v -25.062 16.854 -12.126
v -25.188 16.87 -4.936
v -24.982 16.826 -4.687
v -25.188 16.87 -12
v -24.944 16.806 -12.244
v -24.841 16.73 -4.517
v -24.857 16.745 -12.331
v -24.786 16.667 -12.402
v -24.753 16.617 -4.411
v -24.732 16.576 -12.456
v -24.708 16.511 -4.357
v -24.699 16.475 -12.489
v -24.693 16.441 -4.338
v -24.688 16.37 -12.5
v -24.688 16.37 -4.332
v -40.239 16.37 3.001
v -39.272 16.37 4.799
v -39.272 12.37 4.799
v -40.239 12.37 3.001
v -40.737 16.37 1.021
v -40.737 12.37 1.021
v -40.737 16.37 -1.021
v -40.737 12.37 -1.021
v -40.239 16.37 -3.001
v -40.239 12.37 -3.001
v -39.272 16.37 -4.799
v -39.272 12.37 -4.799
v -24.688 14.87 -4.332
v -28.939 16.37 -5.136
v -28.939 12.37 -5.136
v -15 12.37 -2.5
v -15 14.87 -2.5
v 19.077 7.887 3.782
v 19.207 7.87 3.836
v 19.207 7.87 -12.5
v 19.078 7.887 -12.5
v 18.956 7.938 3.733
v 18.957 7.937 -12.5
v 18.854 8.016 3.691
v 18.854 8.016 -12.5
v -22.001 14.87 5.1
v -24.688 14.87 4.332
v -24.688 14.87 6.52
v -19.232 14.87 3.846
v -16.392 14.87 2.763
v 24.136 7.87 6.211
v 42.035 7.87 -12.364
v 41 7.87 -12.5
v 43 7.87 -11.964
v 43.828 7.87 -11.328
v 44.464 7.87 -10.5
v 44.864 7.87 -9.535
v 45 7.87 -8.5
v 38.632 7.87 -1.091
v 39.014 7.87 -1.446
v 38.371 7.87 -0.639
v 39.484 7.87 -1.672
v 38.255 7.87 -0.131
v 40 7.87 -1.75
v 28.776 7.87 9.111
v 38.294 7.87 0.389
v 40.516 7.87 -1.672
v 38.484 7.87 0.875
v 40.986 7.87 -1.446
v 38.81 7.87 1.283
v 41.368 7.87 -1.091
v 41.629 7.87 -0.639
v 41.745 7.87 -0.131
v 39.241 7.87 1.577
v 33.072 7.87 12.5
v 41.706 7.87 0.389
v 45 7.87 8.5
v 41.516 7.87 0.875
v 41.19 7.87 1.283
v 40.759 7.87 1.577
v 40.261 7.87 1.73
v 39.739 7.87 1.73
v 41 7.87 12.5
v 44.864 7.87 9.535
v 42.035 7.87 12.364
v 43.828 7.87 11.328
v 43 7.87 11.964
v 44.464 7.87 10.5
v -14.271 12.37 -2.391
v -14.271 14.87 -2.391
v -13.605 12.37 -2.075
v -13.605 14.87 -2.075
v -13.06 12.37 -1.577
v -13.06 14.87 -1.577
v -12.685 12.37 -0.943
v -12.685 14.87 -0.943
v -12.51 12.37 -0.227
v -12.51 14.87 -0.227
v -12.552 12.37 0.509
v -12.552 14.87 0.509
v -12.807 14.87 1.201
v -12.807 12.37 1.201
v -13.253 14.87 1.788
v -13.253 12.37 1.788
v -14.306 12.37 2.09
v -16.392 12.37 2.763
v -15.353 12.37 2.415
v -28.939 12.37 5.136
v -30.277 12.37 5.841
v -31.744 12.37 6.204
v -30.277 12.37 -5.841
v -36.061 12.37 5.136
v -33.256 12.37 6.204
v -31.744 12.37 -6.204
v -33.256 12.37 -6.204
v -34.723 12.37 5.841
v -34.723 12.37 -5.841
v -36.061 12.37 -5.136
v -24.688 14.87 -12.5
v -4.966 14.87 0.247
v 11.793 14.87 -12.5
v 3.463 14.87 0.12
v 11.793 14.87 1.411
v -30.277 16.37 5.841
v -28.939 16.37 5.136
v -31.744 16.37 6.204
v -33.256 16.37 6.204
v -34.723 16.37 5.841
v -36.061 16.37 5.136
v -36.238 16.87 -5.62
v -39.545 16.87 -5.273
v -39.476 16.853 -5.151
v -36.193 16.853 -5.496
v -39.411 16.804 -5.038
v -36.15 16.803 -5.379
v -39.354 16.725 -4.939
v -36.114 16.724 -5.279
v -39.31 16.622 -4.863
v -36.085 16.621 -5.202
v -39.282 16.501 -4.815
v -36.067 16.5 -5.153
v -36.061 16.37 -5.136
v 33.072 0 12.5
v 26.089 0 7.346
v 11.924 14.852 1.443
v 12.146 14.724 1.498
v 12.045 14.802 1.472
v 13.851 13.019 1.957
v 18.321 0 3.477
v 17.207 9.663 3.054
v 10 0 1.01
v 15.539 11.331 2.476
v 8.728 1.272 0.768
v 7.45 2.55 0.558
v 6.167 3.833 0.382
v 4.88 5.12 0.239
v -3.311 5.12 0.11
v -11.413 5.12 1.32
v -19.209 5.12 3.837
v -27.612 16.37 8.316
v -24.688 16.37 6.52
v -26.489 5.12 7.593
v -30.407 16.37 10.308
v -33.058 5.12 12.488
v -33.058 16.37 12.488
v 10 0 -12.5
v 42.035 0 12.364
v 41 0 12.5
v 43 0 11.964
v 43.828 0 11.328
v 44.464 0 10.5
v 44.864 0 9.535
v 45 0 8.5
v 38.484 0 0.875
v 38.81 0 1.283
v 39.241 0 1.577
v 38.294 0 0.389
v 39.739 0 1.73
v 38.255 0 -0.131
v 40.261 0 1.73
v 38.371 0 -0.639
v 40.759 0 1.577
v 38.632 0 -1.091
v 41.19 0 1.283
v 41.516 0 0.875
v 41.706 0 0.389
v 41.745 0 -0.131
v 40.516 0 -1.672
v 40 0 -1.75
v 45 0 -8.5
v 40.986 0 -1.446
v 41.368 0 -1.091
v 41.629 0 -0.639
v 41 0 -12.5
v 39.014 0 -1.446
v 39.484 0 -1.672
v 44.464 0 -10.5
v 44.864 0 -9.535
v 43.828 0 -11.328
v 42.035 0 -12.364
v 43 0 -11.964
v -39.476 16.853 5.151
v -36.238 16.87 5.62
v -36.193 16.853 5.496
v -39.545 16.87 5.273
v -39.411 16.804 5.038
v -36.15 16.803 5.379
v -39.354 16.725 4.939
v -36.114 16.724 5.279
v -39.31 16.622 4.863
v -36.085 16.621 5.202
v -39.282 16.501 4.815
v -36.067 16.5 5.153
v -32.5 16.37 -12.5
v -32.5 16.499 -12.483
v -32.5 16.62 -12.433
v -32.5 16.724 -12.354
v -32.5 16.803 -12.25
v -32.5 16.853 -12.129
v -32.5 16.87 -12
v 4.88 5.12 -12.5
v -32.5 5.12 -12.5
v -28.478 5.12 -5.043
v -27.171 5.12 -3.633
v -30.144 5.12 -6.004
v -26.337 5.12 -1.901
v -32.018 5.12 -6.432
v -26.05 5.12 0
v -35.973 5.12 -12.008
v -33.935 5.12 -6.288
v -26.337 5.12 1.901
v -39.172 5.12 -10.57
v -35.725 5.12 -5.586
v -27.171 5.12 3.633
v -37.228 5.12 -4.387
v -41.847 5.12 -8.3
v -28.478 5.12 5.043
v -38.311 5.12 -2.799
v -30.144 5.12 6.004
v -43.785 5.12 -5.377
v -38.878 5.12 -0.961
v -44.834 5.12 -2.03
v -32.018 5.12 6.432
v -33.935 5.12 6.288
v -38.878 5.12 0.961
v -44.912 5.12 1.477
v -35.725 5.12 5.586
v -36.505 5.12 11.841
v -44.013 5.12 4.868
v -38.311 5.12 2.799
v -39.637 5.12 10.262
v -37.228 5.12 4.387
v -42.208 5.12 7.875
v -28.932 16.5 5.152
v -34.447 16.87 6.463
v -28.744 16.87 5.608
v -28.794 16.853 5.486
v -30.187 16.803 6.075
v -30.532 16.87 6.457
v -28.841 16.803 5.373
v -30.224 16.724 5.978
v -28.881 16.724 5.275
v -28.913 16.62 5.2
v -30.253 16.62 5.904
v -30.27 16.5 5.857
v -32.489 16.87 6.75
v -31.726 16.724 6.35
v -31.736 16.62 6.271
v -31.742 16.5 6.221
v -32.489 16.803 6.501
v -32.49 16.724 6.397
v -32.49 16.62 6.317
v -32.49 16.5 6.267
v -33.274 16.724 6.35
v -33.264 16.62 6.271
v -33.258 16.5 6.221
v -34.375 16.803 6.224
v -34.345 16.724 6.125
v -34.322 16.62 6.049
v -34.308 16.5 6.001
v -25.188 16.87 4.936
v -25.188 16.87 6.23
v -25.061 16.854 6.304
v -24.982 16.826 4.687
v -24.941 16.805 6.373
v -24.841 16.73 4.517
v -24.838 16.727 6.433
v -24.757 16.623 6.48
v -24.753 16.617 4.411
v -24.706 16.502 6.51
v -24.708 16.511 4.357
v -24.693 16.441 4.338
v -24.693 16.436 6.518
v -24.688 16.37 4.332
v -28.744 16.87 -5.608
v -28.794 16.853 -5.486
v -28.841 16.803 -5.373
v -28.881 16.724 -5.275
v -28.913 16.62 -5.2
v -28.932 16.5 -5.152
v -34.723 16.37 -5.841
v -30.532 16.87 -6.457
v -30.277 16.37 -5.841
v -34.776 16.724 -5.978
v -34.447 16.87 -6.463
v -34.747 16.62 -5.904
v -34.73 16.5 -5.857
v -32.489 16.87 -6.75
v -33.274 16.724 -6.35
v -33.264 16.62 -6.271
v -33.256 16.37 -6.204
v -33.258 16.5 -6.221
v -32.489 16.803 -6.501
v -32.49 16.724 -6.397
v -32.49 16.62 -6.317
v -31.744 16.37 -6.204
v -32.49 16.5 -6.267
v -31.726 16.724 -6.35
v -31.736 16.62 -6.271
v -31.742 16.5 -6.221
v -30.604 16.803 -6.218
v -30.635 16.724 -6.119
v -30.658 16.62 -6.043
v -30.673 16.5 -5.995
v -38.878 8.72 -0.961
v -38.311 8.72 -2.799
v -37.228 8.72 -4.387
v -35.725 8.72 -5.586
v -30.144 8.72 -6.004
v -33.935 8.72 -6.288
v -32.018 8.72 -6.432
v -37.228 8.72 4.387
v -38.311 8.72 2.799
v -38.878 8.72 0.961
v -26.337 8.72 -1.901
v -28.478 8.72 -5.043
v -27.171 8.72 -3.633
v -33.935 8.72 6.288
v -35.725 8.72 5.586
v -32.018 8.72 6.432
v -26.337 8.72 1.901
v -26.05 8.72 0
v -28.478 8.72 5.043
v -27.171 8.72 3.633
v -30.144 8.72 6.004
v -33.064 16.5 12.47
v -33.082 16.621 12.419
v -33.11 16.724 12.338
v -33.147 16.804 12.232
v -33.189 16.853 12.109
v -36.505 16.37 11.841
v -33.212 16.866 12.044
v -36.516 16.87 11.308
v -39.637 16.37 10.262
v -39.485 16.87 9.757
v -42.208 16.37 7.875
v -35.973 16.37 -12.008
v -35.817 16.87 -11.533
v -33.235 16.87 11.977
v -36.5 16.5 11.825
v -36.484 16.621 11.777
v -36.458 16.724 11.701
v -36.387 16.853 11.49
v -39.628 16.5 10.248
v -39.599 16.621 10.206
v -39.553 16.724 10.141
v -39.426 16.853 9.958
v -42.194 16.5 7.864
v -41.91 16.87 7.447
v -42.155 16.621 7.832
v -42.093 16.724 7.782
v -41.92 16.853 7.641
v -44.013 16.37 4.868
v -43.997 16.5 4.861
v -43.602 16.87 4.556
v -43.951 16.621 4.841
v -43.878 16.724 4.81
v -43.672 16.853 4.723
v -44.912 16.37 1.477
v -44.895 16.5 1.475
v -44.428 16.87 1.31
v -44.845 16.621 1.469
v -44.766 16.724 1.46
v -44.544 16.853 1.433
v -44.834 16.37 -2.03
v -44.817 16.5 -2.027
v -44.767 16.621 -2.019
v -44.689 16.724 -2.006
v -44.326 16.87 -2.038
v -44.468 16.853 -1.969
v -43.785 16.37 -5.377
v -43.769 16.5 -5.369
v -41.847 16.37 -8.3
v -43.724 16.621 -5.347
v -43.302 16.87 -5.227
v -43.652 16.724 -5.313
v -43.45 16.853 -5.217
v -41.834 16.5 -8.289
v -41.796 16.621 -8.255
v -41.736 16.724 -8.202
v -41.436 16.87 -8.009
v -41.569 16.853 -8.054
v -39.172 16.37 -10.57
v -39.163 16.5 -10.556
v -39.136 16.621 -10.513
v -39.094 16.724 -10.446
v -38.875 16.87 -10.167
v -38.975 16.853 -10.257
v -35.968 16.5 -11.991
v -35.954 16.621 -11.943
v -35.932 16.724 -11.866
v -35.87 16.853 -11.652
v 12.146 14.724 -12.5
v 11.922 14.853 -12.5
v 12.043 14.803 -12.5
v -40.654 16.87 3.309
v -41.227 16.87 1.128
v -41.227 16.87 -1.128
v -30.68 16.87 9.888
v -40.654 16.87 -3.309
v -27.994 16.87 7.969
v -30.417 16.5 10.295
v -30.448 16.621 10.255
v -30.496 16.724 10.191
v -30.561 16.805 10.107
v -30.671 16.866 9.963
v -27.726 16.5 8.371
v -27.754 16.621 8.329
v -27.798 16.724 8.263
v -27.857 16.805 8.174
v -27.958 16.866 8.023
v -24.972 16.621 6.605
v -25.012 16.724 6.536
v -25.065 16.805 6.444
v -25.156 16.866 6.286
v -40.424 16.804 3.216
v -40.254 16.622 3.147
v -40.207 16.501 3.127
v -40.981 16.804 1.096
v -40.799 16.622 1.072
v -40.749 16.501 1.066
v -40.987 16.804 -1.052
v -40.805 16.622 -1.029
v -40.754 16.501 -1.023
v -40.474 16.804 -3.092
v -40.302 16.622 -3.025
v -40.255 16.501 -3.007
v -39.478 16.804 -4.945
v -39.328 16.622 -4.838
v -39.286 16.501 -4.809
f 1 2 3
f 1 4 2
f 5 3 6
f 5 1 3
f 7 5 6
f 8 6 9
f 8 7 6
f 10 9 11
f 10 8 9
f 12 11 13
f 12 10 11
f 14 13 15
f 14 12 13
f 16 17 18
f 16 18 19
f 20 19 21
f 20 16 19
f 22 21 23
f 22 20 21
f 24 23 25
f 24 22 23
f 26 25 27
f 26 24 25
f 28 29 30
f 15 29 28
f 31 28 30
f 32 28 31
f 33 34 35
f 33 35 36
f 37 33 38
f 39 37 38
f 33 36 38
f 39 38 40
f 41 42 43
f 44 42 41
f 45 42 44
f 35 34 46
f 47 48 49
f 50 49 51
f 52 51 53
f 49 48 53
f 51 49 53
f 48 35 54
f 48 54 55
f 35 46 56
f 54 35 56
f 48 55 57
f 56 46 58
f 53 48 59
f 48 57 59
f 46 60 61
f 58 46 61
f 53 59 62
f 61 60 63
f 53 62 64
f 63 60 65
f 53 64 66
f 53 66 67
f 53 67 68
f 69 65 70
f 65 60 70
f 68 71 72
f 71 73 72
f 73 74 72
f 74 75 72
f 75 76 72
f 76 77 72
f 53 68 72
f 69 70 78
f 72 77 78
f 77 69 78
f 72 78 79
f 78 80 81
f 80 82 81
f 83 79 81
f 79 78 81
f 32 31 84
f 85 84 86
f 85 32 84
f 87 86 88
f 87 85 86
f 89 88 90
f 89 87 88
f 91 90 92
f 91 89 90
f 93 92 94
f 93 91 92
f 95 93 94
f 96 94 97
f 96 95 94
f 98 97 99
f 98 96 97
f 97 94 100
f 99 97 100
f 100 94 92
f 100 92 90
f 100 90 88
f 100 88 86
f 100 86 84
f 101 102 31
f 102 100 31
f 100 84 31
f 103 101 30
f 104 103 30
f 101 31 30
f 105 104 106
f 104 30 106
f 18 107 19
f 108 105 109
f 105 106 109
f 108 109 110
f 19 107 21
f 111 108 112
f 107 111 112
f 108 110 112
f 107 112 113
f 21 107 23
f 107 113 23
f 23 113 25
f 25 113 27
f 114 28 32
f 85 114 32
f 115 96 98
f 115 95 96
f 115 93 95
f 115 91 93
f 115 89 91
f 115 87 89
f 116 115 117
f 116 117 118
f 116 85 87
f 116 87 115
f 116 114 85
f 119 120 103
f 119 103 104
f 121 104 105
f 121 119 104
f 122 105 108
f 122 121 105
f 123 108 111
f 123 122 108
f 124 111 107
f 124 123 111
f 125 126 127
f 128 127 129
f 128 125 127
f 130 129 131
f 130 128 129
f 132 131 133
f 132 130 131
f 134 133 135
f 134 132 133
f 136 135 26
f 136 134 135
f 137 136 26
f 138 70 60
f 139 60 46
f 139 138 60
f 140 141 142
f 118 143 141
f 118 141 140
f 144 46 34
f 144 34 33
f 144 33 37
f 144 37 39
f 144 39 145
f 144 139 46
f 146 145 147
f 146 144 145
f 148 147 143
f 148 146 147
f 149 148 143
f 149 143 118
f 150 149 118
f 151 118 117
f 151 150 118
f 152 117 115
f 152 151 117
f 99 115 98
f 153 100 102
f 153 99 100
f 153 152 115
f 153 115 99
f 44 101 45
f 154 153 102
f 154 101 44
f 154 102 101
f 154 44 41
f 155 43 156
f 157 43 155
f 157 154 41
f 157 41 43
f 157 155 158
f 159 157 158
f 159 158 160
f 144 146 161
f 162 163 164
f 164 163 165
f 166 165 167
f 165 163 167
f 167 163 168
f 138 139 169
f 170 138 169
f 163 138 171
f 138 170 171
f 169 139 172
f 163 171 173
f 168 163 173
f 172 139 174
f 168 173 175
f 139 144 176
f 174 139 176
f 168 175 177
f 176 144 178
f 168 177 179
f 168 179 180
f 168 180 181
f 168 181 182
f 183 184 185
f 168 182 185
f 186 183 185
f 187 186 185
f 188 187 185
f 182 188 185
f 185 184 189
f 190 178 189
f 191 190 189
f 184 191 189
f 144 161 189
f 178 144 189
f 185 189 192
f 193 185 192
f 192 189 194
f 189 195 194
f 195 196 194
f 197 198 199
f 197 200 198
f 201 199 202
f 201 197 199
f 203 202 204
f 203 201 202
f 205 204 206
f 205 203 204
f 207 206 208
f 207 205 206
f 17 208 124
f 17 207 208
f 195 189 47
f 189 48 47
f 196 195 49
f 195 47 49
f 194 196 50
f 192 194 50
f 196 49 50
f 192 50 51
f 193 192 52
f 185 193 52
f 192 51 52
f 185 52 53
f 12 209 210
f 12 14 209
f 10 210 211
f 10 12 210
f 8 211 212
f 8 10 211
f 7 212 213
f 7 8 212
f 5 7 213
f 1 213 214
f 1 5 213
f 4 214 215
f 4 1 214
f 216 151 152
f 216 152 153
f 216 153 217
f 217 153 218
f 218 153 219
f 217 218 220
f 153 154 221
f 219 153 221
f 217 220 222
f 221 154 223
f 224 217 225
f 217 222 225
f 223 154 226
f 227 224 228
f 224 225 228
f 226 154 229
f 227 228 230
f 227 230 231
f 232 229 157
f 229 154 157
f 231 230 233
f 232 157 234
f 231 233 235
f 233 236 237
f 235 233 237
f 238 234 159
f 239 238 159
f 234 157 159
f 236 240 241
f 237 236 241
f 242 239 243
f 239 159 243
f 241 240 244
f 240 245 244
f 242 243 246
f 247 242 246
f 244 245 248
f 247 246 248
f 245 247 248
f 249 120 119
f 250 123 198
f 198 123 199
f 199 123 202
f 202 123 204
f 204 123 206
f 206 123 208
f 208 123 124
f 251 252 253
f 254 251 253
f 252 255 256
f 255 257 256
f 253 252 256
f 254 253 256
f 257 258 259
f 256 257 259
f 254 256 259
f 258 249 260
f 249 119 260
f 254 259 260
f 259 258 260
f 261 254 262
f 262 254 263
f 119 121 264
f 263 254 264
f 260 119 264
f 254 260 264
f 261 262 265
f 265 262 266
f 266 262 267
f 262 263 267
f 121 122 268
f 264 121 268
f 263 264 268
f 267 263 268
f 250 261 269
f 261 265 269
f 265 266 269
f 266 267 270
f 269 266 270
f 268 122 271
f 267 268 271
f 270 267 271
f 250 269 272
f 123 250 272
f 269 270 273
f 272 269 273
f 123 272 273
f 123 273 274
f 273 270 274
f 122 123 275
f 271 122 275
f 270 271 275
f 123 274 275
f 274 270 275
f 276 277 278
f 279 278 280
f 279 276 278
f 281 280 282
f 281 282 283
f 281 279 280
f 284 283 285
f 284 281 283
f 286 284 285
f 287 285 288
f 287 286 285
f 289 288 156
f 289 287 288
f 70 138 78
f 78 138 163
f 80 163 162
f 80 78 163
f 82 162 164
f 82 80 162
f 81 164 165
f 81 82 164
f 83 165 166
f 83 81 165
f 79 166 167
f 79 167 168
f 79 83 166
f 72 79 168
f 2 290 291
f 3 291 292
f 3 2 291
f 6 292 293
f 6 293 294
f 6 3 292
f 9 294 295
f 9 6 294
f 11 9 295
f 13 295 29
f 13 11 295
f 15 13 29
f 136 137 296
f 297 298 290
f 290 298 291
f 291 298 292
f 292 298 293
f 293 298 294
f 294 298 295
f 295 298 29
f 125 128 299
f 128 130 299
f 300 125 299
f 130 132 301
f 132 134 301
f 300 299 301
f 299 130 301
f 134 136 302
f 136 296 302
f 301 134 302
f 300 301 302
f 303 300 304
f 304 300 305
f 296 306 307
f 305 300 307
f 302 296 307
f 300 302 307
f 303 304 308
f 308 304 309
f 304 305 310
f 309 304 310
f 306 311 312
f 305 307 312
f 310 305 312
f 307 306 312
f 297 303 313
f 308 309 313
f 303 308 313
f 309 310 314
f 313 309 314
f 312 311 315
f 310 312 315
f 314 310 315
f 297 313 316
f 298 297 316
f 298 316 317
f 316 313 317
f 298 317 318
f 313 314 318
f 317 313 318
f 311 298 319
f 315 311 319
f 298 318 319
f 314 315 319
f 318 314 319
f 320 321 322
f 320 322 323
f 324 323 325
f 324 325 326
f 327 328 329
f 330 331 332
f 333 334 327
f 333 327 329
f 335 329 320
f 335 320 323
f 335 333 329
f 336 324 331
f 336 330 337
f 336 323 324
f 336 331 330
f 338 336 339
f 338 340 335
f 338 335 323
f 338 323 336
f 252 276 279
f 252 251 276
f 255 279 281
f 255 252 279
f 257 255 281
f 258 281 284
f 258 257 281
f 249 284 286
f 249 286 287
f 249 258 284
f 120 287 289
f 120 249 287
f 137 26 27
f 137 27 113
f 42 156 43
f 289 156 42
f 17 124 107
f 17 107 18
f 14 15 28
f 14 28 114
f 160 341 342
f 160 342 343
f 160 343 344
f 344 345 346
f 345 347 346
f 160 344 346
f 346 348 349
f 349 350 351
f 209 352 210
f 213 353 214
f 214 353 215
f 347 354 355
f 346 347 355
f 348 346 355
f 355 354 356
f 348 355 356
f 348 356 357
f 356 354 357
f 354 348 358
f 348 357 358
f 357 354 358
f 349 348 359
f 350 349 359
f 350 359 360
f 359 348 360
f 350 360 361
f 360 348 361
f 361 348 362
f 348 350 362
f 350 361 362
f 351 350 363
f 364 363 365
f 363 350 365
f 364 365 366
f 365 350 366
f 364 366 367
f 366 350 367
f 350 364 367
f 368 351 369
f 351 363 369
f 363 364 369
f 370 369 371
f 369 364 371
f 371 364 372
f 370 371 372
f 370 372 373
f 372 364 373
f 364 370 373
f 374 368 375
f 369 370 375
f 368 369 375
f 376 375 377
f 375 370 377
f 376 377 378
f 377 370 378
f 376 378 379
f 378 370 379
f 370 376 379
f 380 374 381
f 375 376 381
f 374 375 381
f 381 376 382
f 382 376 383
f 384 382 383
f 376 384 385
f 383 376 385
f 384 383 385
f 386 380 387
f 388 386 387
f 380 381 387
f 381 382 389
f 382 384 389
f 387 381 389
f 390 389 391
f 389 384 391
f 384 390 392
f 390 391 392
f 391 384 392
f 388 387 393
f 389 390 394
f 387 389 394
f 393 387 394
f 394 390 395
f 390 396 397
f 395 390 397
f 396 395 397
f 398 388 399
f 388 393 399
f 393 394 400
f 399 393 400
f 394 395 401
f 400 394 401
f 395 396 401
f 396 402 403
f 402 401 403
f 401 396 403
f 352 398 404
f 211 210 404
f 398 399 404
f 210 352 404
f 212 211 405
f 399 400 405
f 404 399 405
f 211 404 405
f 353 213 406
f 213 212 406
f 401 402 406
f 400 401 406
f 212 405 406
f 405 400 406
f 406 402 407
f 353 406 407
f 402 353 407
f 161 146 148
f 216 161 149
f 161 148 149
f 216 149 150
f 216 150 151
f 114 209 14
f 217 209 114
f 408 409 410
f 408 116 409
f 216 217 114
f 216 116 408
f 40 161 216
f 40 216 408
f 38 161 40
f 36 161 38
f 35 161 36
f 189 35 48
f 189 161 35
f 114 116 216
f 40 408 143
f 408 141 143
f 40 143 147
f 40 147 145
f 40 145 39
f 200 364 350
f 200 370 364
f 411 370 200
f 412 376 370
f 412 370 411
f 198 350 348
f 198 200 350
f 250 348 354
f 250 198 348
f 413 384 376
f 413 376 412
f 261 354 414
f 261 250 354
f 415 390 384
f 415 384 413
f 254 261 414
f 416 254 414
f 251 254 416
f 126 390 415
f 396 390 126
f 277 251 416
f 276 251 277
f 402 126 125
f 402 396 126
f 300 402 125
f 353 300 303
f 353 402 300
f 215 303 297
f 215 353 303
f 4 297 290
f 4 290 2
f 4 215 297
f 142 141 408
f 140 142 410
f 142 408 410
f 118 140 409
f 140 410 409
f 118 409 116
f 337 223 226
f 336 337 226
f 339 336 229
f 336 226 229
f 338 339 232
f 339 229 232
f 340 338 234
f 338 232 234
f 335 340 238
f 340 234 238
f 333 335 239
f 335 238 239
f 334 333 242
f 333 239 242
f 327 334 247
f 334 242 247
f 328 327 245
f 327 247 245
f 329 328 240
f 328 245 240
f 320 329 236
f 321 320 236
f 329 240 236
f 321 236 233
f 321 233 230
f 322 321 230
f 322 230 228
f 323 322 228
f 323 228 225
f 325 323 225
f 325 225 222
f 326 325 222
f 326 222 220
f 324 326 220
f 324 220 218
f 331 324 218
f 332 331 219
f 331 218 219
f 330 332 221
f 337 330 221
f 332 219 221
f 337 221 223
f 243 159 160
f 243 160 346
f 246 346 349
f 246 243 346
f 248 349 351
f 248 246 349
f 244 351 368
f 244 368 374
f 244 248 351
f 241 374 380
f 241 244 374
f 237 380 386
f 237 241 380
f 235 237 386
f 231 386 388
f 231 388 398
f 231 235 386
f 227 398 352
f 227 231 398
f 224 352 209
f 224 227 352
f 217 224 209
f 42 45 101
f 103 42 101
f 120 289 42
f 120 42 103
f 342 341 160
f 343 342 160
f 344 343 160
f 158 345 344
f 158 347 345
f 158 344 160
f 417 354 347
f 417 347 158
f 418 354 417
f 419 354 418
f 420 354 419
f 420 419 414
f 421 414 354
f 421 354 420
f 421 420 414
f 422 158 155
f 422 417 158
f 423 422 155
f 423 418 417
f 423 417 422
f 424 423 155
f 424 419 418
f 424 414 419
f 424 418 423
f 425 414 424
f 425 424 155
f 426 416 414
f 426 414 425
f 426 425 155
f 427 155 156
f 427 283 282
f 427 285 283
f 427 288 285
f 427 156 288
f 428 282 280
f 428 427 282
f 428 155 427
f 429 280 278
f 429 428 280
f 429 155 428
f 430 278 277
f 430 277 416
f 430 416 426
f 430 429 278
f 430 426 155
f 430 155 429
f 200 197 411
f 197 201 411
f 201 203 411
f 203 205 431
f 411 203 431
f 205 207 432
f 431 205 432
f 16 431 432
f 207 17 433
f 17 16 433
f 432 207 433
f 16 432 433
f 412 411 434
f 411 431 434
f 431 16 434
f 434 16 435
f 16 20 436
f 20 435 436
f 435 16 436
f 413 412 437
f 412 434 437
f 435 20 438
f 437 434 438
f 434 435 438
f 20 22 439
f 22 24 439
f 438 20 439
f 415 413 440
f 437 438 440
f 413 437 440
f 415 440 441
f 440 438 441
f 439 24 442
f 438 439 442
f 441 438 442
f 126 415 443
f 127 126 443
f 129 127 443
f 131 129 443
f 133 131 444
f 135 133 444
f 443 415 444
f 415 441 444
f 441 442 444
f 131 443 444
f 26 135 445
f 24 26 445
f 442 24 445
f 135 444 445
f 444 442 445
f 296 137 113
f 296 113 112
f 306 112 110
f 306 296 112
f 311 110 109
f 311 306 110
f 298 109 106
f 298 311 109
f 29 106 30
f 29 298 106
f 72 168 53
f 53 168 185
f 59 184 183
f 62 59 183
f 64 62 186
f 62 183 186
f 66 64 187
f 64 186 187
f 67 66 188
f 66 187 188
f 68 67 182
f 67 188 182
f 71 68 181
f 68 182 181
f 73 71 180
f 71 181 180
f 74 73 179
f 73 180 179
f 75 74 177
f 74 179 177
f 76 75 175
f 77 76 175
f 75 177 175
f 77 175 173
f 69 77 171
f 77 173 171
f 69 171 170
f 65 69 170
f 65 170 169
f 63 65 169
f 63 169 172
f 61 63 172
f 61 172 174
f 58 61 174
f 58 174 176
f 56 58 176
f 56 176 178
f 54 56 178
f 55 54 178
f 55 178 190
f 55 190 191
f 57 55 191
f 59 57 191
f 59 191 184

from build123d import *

# Parameters (mm, degrees)
SKETCH1_W                    = 90
SKETCH1_H                    = 25
BOSS_EXTRUDE1_DEPTH          = 16.87
CUT_EXTRUDE2_DEPTH           = 4.5
ENL_V_MAT_EXTRU_1_DEPTH      = 34
FILLET1_RADIUS               = 12.5
FILLET1_LENGTH               = 11.75
ESQUISSE5_R                  = 1.75
ENL_V_MAT_EXTRU_4_DEPTH      = 50.65729453
FILLET3_R                    = 4
SKETCH8_W                    = 38.029495875
SKETCH8_H                    = 20.943583685
CUT_EXTRUDE6_DEPTH           = 2
ESQUISSE17_R                 = 6.45
ENL_V_MAT_EXTRU_7_DEPTH      = 3.6
ENL_V_MAT_EXTRU_8_DEPTH      = 50.65729453
ENL_V_MAT_EXTRU_8_DEPTH_BACK = 50.65729453
ESQUISSE18_R                 = 50
FILLET4_R                    = 0.5


with BuildPart() as part:
    # Sketch1 → Boss-Extrude1 (new body)
    with BuildSketch(Plane(origin=(0, 0, 0), x_dir=(1, 0, 0), z_dir=(0, 1, 0))):
        Rectangle(SKETCH1_W, SKETCH1_H)
    extrude(amount=BOSS_EXTRUDE1_DEPTH)

    # Sketch3 → Cut-Extrude2 (cut)
    with BuildSketch(Plane(origin=(0, 16.87, 0), x_dir=(1, 0, 0), z_dir=(0, 1, 0))):
        with BuildLine():
            Line((-39.272085844, 4.798838748), (-36.060975614, 5.136336504))
            ThreePointArc((-36.060975614, 5.136336504), (-32.500000002, 6.25), (-28.93902439, 5.136336506))
            Line((-28.93902439, 5.136336506), (-15, 2.5))
            ThreePointArc((-15, 2.5), (-12.5, 0), (-15, -2.5))
            Line((-15, -2.5), (-28.93902439, -5.136336506))
            ThreePointArc((-28.93902439, -5.136336506), (-32.500000002, -6.25), (-36.060975614, -5.136336504))
            Line((-36.060975614, -5.136336504), (-39.272085844, -4.798838748))
            ThreePointArc((-39.272085844, -4.798838748), (-40.8, 0), (-39.272085844, 4.798838748))
        make_face()
    extrude(amount=-CUT_EXTRUDE2_DEPTH, mode=Mode.SUBTRACT)

    # Esquisse2 → Enlèv. mat.-Extru.1 (cut)
    with BuildSketch(Plane.XY.offset(12.5)):
        Polygon((45, 16.87), (10, 16.87), (19, 7.87), (45, 7.87), align=None)
        Polygon((-45, 0), (10, 0), (4.88, 5.12), (-45, 5.12), align=None)
    extrude(amount=-ENL_V_MAT_EXTRU_1_DEPTH, mode=Mode.SUBTRACT)

    # Fillet1: full round fillet: the end face becomes a half cylinder, R = half its width
    fillet1_face = Plane((-45, 10.995, 0), x_dir=(0, -1, 0), z_dir=(-1, 0, 0))  # on the end face: x along it, z out of the body
    fillet1_slab = fillet1_face.offset(-FILLET1_RADIUS / 2) * Box(FILLET1_LENGTH, 2 * FILLET1_RADIUS, FILLET1_RADIUS, mode=Mode.PRIVATE)  # the body's end, R deep
    fillet1_round = Plane((-32.5, 10.995, 0), x_dir=(-1, 0, 0), z_dir=(0, -1, 0)) * Cylinder(FILLET1_RADIUS, FILLET1_LENGTH, mode=Mode.PRIVATE)  # its axis R under the face
    add(fillet1_slab - fillet1_round, mode=Mode.SUBTRACT)

    # Esquisse5 → Enlèv. mat.-Extru.4 (cut, through all)
    with BuildSketch(Plane(origin=(0, 0, 0), x_dir=(-1, 0, 0), z_dir=(0, -1, 0))):
        with Locations(Location((-40, 0, 0), (0, 0, 90))):
            Circle(ESQUISSE5_R)
    extrude(amount=-ENL_V_MAT_EXTRU_4_DEPTH, mode=Mode.SUBTRACT)

    # Fillet3
    fillet3_edges = [part.edges().sort_by_distance(p)[0] for p in [
        (45, 3.935, -12.5),
        (45, 3.935, 12.5),
    ]]
    fillet(fillet3_edges, radius=FILLET3_R)

    # Sketch8 → Cut-Extrude6 (cut)
    with BuildSketch(Plane(origin=(0, 16.87, 0), x_dir=(1, 0, 0), z_dir=(0, 1, 0))):
        with Locations((-5.673362901, 3.675760168)):
            Rectangle(SKETCH8_W, SKETCH8_H)
    extrude(amount=-CUT_EXTRUDE6_DEPTH, mode=Mode.SUBTRACT)

    # Esquisse17 → Enlèv. mat.-Extru.7 (cut)
    with BuildSketch(Plane.XZ.offset(-5.12)):
        with Locations((-32.5, 0)):
            Circle(ESQUISSE17_R)
    extrude(amount=-ENL_V_MAT_EXTRU_7_DEPTH, mode=Mode.SUBTRACT)

    # Esquisse18 → Enlèv. mat.-Extru.8 (cut, two sides: drawn at the far end of the back side and taken through both)
    with BuildSketch(Plane(origin=(0, 0, 0), x_dir=(1, 0, 0), z_dir=(0, 1, 0)).offset(-ENL_V_MAT_EXTRU_8_DEPTH_BACK)):
        with Locations((0, -50)):
            Circle(ESQUISSE18_R)
    extrude(amount=ENL_V_MAT_EXTRU_8_DEPTH + ENL_V_MAT_EXTRU_8_DEPTH_BACK, mode=Mode.SUBTRACT)

    # Fillet4
    fillet4_edges = [part.edges().sort_by_distance(p)[0] for p in [
        (-28.594055419, 16.87, -12.5),
        (19, 7.87, -4.37466216),
        (12, 14.87, -5.519322199),
        (-37.666530729, 16.87, -4.967587626),
        (-26.813567614, 16.87, -4.734341422),
        (-32.500000002, 16.87, -6.25),
        (-37.666530729, 16.87, 4.967587626),
        (-24.688110839, 16.87, 5.426249162),
        (-26.813567614, 16.87, 4.734341422),
        (-32.500000002, 16.87, 6.25),
        (-40.8, 16.87, 0),
        (-24.688110839, 16.87, -8.416173168),
        (-29.026696429, 16.87, 9.288197111),
        (-44.996887004, 16.87, -0.278953754),
    ]]
    fillet(fillet4_edges, radius=FILLET4_R)


solid = part.part
